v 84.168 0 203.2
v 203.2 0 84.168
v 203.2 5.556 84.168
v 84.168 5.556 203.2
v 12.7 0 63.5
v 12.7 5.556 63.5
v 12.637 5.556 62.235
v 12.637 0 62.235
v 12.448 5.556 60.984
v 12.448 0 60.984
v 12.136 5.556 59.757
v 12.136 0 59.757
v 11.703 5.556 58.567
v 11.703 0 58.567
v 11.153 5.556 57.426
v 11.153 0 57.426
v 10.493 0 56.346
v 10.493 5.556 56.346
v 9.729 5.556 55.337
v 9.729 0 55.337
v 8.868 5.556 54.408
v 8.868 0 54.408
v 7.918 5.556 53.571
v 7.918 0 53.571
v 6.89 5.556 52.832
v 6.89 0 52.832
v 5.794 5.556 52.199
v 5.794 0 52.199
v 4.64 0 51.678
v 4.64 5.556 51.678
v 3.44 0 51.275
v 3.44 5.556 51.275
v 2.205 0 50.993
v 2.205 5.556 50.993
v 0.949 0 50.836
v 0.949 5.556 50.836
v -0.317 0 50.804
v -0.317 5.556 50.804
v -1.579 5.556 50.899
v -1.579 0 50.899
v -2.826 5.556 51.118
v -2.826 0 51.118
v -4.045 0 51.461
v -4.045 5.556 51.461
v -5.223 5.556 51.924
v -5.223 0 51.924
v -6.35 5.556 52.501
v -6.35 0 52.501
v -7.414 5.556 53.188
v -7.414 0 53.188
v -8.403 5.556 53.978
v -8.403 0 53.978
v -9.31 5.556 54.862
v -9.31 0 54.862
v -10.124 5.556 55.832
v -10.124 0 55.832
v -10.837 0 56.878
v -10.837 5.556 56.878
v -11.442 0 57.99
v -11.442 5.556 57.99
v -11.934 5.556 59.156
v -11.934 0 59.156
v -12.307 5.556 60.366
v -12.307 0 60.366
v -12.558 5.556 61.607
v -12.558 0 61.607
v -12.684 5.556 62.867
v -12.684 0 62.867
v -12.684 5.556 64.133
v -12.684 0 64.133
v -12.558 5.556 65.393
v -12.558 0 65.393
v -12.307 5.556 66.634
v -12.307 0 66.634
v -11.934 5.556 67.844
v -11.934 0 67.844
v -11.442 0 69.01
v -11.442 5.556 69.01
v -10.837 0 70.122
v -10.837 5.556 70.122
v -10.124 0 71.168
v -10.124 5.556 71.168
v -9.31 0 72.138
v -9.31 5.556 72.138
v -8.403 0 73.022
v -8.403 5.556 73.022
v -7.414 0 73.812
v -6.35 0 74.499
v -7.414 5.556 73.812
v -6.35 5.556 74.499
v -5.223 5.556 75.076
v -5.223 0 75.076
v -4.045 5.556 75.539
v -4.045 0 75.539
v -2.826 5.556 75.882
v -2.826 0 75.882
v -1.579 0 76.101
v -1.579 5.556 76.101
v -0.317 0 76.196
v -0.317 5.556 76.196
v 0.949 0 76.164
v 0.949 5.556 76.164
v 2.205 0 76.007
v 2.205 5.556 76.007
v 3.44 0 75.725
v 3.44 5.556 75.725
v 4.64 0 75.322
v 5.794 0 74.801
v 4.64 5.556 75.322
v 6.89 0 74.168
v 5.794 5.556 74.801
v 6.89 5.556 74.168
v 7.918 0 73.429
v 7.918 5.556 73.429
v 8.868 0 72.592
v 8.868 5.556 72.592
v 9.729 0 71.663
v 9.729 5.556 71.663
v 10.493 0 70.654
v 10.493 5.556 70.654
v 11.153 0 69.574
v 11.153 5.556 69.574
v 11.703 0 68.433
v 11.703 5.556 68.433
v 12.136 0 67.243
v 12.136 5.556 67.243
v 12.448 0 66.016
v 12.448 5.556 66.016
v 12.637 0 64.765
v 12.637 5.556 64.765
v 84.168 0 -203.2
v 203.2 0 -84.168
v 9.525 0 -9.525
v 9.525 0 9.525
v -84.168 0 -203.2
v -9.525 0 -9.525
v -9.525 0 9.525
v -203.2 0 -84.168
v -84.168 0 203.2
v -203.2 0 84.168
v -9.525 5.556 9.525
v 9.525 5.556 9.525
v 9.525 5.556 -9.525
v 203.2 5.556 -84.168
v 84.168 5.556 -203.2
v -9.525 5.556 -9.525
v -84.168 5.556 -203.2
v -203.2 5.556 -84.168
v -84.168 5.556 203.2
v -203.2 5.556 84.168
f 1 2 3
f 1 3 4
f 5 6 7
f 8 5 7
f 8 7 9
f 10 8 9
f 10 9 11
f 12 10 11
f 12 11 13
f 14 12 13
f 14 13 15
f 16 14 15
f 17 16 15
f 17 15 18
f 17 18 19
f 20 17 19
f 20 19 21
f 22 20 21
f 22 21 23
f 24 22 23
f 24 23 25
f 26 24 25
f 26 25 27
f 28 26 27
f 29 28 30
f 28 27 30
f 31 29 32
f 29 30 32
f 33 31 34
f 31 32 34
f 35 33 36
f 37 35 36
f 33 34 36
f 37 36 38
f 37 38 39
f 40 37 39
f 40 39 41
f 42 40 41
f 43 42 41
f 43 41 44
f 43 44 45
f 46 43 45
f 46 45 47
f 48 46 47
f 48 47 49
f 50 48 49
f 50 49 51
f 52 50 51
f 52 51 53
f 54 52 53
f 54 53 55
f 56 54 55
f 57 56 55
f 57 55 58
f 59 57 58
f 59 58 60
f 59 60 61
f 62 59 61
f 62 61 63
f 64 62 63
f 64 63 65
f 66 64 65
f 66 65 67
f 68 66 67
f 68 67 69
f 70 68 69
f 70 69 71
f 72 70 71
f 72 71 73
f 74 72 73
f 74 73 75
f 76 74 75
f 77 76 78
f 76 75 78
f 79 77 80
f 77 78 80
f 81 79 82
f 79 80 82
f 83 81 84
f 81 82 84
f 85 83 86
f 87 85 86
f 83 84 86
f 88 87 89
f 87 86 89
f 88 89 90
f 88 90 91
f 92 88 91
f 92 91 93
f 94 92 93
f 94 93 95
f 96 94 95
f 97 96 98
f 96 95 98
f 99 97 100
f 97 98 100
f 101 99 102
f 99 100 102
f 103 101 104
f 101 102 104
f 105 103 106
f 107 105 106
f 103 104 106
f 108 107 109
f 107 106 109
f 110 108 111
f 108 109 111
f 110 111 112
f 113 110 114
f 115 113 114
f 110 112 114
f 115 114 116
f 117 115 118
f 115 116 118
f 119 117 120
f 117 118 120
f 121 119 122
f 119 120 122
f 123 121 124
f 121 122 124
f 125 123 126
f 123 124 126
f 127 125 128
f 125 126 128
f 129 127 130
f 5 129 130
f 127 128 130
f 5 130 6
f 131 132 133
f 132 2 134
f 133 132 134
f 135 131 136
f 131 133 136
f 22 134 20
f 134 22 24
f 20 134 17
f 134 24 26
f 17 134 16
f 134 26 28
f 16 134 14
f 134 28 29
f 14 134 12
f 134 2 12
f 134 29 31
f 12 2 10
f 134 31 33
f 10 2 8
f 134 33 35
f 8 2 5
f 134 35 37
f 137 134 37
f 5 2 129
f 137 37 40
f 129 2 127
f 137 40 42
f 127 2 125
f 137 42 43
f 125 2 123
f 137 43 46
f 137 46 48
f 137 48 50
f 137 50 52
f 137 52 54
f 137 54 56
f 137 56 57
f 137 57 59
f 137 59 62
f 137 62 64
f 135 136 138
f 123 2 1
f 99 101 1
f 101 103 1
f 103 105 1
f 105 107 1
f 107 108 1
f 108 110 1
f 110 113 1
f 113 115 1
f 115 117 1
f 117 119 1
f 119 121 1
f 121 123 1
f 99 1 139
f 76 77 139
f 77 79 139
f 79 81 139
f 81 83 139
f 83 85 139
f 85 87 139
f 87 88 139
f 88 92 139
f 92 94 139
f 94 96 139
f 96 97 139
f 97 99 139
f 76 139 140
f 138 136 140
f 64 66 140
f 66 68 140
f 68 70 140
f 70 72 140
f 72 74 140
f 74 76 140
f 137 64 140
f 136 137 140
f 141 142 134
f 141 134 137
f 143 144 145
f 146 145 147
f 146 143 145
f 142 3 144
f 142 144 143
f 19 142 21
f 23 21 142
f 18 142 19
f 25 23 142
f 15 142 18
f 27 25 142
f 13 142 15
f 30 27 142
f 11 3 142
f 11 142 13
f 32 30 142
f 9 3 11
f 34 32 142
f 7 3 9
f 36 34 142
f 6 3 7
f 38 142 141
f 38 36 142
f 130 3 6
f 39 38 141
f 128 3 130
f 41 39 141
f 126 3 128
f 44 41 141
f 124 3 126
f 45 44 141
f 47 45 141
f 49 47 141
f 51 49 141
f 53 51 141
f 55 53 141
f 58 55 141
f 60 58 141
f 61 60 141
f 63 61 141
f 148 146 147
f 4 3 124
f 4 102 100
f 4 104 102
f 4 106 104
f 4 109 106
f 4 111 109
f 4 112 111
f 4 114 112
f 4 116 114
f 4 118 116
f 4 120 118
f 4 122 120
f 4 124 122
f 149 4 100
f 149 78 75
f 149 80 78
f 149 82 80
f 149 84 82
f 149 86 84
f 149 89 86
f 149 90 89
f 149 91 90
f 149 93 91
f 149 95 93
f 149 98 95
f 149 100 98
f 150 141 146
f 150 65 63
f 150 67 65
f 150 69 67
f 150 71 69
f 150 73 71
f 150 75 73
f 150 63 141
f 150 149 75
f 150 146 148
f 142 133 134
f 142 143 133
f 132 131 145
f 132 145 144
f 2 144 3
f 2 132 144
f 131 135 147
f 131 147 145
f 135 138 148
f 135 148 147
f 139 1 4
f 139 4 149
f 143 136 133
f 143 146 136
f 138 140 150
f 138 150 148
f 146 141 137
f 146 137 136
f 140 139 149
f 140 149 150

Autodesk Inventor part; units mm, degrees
ref_plane "YZ Plane" through (0, 0, 0) normal (1, 0, 0) x (0, 1, 0)
ref_plane "XZ Plane" through (0, 0, 0) normal (0, 1, 0) x (-1, 0, 0)
ref_plane "XY Plane" through (0, 0, 0) normal (0, 0, 1) x (1, 0, 0)
sketch "Sketch1" plane through (0, 0, 0) normal (0, 1, 0) x (-1, 0, 0)
  line L0 (-203.2, 84.1682) -> (-84.1682, 203.2)
  line L1 (-84.1682, 203.2) -> (84.1682, 203.2)
  line L2 (84.1682, 203.2) -> (203.2, 84.1682)
  line L3 (203.2, 84.1682) -> (203.2, -84.1682)
  line L4 (203.2, -84.1682) -> (84.1682, -203.2)
  line L5 (84.1682, -203.2) -> (-84.1682, -203.2)
  line L6 (-84.1682, -203.2) -> (-203.2, -84.1682)
  line L7 (-203.2, -84.1682) -> (-203.2, 84.1682)
  point P0 (0, 0)
  point P1 (0, 0)
  dimension "d0" = 406.4
extrude "Extrusion1" add sketch "Sketch1" along normal blind 5.5563
sketch "Sketch2" plane through (0, 5.5563, 0) normal (0, 1, 0) x (1, 0, 0)
  line L0 (9.525, -9.525) -> (-9.525, -9.525)
  line L1 (-9.525, -9.525) -> (-9.525, 9.525)
  line L2 (-9.525, 9.525) -> (9.525, 9.525)
  line L3 (9.525, 9.525) -> (9.525, -9.525)
  circle A0 centre (0, -63.5) radius 12.7
  point P0 (0, 0)
  dimension "d3" = 19.05
  dimension "d4" = 19.05
  dimension "d5" = 9.525
  dimension "d6" = 9.525
  dimension "d9" = 25.4
  dimension "d10" = 63.5
extrude "Extrusion2" cut sketch "Sketch2" against normal through all
equation "\"d0\" = BaseWidth"
equation "\"d3\" = MastWidth"
equation "\"d4\" = d3"
equation "\"d5\" = 0.5 * d3"
equation "\"d6\" = 0.5 * d3"
equation "\"d9\" = WireHoleDiameter"
equation "\"d10\" = WireHoleOffset"
equation "\"BaseWidth\" = 406.4"
equation "\"MastWidth\" = 19.05"
equation "\"WireHoleDiameter\" = 25.4"
equation "\"WireHoleOffset\" = 63.5"
properties part number "Robot-Upper-Base" material "Wood (Birch)"
